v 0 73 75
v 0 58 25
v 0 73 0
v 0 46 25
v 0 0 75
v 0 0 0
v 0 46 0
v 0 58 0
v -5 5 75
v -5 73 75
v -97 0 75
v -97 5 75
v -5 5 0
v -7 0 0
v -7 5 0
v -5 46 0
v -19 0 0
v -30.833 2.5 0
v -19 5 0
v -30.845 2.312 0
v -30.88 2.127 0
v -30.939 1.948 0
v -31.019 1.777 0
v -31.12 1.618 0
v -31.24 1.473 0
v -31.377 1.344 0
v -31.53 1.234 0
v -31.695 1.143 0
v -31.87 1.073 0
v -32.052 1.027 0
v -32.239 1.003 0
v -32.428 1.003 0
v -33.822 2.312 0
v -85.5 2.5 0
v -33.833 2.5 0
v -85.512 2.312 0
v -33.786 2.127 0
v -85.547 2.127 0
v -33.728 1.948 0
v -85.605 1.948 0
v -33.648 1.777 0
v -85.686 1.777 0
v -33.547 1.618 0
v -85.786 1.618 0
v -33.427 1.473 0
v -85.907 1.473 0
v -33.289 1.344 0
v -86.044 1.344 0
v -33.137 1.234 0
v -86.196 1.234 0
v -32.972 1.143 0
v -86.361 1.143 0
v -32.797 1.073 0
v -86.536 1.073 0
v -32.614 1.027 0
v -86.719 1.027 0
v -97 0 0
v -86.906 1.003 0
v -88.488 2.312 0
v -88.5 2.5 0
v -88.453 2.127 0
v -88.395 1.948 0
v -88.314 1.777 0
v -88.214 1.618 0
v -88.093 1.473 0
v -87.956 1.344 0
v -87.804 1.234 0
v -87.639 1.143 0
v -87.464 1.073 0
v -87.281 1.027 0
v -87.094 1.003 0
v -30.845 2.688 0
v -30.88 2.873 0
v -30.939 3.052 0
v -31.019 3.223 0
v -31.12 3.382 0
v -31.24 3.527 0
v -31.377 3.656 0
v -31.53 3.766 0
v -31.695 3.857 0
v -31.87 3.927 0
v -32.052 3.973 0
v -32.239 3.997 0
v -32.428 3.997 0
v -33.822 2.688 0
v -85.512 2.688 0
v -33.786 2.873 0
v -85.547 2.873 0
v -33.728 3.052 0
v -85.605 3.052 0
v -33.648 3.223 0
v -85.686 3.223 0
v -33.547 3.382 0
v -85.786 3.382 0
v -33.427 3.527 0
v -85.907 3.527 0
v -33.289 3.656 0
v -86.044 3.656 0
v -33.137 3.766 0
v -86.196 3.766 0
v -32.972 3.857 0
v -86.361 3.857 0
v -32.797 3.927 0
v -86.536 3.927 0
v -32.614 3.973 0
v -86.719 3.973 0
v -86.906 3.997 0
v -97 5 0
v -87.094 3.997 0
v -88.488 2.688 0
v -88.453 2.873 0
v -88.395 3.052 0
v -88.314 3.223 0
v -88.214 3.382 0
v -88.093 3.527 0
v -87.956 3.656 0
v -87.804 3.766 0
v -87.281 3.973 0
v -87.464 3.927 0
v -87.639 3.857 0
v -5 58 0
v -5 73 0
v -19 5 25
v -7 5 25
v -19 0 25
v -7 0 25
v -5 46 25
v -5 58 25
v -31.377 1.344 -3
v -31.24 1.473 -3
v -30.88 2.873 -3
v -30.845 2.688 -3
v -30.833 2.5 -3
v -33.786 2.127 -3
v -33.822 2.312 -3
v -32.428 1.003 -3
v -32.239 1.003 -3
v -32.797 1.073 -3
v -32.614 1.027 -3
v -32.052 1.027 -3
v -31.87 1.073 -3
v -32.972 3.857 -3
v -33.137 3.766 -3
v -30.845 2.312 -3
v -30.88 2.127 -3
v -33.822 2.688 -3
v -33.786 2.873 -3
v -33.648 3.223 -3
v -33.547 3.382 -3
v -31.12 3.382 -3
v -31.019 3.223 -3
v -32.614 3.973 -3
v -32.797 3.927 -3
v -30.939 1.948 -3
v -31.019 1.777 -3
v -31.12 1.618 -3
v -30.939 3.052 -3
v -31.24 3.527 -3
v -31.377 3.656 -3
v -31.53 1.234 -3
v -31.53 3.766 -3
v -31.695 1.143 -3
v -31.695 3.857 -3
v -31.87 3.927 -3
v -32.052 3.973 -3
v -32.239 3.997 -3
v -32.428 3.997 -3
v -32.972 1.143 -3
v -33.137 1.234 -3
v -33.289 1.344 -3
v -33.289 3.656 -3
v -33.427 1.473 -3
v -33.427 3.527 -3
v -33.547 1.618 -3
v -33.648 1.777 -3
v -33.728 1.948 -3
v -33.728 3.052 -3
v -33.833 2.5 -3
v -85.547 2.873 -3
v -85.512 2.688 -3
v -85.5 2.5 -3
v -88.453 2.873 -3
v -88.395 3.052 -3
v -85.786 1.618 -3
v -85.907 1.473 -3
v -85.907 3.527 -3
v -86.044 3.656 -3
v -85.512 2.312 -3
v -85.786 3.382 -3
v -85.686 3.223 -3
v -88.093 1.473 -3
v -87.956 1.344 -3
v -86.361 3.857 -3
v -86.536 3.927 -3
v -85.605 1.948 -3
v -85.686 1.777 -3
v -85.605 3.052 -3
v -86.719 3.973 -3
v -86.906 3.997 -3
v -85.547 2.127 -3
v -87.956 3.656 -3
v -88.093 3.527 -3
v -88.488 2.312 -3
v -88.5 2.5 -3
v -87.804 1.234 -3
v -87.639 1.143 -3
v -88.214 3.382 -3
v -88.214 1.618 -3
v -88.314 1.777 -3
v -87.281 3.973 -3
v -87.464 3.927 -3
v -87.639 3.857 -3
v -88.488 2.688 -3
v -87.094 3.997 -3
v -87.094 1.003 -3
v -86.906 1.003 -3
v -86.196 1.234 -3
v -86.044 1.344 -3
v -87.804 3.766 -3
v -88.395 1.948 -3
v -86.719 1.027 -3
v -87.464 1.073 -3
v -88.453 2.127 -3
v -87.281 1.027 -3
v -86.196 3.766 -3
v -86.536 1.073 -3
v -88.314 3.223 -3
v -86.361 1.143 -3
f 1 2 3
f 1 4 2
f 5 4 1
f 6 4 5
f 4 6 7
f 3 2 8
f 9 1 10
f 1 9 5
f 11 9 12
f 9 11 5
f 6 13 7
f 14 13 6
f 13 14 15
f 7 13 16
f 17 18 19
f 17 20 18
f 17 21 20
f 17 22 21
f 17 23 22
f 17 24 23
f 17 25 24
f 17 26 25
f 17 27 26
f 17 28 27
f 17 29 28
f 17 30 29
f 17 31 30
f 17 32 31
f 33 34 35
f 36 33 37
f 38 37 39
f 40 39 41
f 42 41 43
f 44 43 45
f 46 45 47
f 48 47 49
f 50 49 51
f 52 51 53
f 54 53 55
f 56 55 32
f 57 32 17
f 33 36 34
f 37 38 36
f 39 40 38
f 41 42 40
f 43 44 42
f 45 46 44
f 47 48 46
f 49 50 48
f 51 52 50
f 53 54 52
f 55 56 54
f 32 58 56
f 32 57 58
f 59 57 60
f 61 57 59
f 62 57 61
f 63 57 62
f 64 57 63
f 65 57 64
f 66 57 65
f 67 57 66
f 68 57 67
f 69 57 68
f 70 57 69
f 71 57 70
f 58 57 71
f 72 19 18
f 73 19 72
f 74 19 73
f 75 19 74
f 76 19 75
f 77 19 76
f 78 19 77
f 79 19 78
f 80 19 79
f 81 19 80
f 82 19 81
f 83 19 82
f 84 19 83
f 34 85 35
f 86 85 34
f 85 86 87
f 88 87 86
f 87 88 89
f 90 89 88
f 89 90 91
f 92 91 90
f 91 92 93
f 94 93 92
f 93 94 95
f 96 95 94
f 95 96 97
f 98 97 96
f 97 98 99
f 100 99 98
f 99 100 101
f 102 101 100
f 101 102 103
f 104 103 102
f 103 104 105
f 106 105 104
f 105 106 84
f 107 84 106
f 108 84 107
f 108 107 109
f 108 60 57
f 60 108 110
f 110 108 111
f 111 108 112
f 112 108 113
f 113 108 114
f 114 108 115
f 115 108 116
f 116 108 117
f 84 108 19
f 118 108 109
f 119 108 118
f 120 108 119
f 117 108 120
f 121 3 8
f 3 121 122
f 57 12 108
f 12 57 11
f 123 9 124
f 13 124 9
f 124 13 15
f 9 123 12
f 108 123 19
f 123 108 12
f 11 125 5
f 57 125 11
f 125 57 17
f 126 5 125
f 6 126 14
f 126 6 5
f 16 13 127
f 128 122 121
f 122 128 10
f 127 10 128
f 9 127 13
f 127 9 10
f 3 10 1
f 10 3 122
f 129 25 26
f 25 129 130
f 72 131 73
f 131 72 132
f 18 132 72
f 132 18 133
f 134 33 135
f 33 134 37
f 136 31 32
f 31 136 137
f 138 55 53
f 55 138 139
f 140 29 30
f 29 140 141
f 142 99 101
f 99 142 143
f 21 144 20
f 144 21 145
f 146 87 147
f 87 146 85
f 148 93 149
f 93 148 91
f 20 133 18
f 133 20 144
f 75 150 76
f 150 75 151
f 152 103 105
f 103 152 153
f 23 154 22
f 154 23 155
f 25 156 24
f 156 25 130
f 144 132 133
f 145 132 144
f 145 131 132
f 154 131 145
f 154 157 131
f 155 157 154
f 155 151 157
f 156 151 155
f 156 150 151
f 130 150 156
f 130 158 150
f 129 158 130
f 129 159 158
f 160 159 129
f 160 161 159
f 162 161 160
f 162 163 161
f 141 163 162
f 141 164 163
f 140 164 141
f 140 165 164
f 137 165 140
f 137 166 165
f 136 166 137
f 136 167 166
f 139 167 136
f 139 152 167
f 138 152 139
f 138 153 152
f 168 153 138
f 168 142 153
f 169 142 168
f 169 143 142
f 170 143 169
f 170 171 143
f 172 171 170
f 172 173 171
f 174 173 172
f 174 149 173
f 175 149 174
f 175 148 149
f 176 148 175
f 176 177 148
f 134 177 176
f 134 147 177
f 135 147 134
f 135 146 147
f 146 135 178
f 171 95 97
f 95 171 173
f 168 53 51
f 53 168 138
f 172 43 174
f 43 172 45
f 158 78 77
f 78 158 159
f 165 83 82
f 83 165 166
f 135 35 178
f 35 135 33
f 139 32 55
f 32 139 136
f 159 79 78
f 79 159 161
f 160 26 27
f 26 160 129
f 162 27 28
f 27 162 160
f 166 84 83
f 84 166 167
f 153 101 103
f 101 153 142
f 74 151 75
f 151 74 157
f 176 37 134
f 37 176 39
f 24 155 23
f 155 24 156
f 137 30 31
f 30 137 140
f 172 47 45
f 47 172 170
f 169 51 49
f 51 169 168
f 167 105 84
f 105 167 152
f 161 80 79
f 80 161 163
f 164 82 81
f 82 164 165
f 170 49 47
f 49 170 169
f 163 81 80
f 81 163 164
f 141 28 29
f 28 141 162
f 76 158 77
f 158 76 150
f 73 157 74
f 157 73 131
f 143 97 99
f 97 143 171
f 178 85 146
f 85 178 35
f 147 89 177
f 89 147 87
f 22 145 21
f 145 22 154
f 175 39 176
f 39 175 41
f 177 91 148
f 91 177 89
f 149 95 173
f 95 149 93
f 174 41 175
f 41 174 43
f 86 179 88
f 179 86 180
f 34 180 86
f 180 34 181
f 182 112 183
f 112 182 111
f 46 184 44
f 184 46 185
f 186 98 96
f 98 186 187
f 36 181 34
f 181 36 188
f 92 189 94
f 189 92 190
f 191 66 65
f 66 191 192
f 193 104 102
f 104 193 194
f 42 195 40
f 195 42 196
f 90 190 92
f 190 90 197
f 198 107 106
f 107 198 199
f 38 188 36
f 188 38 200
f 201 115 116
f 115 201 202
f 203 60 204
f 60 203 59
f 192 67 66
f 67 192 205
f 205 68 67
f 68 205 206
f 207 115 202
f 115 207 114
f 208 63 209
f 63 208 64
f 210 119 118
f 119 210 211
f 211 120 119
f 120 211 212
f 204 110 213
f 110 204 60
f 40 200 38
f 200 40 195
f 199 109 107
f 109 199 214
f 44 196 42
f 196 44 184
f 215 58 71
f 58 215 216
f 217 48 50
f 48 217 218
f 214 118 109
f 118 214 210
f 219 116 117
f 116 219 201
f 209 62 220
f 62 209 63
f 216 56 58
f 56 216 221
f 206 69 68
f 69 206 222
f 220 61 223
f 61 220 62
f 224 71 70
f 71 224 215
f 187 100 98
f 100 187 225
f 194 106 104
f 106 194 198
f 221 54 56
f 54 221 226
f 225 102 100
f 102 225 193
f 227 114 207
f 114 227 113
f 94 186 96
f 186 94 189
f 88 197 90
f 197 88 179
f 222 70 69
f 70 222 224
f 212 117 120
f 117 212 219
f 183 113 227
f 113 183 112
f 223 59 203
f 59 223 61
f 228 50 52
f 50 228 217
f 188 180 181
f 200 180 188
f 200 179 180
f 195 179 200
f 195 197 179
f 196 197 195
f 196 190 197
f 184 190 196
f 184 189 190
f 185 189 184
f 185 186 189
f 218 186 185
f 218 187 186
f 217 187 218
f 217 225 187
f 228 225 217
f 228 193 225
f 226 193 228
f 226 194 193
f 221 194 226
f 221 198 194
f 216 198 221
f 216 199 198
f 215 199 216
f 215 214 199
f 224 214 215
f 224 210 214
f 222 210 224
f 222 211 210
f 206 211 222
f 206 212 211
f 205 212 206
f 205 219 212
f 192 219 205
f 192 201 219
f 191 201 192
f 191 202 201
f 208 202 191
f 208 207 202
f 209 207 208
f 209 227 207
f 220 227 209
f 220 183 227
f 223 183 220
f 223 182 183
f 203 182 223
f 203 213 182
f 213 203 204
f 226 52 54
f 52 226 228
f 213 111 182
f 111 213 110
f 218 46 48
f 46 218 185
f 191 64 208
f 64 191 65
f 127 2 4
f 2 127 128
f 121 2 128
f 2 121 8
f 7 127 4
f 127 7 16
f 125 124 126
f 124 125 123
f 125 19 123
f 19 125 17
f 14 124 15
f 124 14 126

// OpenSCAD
//Spessore parete del corridoio, con la porta
spessore_uno=5; 
//lunghezza della prima parete
lunghezza_uno=73; 

//spessore parete divisoria degli ambienti
spessore_due=5;
lunghezza_due = 97; 
//
//altezza uguale per tutte le pareti
altezza=75; 


//dati relativi alla porta
altezza_porta = 25; 
larghezza_porta = 12;
//distanza della porta a partire dall'angolo esterno
distanza_porta = 46;

//parametri relativi alle finestre, ma non ancora inseriti nel modello
lunghezza_fin=15;
 altezza_fin=11;

due_pareti_porta();


//con questa funzione si creano due pareti ad angolo retto
module due_pareti(){
   union(){
   translate([-lunghezza_due,0,0]){ cube([lunghezza_due, spessore_due, altezza]);
   }
   rotate([0,0,90])    cube([lunghezza_uno, spessore_uno, altezza]);
    translate([-lunghezza_due/3,spessore_due/2,-3])cylinder(10, 1.5,1.5, $fn=50);
    translate([-lunghezza_due+10,spessore_due/2,-3])cylinder(10, 1.5,1.5, $fn=50);
   }
}


module due_pareti_porta(){
    
    difference(){
        due_pareti();
        translate([-spessore_due,distanza_porta,0]) cube([spessore_due,larghezza_porta,altezza_porta]);
    
        rotate ([0,0,90])translate([0,7,0]) cube([spessore_due,larghezza_porta,altezza_porta]);
        
        rotate ([0,0,90])translate([0,150,0]) cube([spessore_due,larghezza_porta,altezza_porta]);
     }
}

module finestra(){
    
    cube([lunghezza_fin, spessore, altezza_fin]);
    
    }
    
    
    
